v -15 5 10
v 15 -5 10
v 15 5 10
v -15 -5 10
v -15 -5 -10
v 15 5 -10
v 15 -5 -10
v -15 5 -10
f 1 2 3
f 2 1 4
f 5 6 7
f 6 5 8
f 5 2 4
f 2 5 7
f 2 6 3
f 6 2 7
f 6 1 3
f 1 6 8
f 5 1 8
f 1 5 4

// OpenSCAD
// Generated by generate_scads.py
cube(size=[30,10,20], center=true);
